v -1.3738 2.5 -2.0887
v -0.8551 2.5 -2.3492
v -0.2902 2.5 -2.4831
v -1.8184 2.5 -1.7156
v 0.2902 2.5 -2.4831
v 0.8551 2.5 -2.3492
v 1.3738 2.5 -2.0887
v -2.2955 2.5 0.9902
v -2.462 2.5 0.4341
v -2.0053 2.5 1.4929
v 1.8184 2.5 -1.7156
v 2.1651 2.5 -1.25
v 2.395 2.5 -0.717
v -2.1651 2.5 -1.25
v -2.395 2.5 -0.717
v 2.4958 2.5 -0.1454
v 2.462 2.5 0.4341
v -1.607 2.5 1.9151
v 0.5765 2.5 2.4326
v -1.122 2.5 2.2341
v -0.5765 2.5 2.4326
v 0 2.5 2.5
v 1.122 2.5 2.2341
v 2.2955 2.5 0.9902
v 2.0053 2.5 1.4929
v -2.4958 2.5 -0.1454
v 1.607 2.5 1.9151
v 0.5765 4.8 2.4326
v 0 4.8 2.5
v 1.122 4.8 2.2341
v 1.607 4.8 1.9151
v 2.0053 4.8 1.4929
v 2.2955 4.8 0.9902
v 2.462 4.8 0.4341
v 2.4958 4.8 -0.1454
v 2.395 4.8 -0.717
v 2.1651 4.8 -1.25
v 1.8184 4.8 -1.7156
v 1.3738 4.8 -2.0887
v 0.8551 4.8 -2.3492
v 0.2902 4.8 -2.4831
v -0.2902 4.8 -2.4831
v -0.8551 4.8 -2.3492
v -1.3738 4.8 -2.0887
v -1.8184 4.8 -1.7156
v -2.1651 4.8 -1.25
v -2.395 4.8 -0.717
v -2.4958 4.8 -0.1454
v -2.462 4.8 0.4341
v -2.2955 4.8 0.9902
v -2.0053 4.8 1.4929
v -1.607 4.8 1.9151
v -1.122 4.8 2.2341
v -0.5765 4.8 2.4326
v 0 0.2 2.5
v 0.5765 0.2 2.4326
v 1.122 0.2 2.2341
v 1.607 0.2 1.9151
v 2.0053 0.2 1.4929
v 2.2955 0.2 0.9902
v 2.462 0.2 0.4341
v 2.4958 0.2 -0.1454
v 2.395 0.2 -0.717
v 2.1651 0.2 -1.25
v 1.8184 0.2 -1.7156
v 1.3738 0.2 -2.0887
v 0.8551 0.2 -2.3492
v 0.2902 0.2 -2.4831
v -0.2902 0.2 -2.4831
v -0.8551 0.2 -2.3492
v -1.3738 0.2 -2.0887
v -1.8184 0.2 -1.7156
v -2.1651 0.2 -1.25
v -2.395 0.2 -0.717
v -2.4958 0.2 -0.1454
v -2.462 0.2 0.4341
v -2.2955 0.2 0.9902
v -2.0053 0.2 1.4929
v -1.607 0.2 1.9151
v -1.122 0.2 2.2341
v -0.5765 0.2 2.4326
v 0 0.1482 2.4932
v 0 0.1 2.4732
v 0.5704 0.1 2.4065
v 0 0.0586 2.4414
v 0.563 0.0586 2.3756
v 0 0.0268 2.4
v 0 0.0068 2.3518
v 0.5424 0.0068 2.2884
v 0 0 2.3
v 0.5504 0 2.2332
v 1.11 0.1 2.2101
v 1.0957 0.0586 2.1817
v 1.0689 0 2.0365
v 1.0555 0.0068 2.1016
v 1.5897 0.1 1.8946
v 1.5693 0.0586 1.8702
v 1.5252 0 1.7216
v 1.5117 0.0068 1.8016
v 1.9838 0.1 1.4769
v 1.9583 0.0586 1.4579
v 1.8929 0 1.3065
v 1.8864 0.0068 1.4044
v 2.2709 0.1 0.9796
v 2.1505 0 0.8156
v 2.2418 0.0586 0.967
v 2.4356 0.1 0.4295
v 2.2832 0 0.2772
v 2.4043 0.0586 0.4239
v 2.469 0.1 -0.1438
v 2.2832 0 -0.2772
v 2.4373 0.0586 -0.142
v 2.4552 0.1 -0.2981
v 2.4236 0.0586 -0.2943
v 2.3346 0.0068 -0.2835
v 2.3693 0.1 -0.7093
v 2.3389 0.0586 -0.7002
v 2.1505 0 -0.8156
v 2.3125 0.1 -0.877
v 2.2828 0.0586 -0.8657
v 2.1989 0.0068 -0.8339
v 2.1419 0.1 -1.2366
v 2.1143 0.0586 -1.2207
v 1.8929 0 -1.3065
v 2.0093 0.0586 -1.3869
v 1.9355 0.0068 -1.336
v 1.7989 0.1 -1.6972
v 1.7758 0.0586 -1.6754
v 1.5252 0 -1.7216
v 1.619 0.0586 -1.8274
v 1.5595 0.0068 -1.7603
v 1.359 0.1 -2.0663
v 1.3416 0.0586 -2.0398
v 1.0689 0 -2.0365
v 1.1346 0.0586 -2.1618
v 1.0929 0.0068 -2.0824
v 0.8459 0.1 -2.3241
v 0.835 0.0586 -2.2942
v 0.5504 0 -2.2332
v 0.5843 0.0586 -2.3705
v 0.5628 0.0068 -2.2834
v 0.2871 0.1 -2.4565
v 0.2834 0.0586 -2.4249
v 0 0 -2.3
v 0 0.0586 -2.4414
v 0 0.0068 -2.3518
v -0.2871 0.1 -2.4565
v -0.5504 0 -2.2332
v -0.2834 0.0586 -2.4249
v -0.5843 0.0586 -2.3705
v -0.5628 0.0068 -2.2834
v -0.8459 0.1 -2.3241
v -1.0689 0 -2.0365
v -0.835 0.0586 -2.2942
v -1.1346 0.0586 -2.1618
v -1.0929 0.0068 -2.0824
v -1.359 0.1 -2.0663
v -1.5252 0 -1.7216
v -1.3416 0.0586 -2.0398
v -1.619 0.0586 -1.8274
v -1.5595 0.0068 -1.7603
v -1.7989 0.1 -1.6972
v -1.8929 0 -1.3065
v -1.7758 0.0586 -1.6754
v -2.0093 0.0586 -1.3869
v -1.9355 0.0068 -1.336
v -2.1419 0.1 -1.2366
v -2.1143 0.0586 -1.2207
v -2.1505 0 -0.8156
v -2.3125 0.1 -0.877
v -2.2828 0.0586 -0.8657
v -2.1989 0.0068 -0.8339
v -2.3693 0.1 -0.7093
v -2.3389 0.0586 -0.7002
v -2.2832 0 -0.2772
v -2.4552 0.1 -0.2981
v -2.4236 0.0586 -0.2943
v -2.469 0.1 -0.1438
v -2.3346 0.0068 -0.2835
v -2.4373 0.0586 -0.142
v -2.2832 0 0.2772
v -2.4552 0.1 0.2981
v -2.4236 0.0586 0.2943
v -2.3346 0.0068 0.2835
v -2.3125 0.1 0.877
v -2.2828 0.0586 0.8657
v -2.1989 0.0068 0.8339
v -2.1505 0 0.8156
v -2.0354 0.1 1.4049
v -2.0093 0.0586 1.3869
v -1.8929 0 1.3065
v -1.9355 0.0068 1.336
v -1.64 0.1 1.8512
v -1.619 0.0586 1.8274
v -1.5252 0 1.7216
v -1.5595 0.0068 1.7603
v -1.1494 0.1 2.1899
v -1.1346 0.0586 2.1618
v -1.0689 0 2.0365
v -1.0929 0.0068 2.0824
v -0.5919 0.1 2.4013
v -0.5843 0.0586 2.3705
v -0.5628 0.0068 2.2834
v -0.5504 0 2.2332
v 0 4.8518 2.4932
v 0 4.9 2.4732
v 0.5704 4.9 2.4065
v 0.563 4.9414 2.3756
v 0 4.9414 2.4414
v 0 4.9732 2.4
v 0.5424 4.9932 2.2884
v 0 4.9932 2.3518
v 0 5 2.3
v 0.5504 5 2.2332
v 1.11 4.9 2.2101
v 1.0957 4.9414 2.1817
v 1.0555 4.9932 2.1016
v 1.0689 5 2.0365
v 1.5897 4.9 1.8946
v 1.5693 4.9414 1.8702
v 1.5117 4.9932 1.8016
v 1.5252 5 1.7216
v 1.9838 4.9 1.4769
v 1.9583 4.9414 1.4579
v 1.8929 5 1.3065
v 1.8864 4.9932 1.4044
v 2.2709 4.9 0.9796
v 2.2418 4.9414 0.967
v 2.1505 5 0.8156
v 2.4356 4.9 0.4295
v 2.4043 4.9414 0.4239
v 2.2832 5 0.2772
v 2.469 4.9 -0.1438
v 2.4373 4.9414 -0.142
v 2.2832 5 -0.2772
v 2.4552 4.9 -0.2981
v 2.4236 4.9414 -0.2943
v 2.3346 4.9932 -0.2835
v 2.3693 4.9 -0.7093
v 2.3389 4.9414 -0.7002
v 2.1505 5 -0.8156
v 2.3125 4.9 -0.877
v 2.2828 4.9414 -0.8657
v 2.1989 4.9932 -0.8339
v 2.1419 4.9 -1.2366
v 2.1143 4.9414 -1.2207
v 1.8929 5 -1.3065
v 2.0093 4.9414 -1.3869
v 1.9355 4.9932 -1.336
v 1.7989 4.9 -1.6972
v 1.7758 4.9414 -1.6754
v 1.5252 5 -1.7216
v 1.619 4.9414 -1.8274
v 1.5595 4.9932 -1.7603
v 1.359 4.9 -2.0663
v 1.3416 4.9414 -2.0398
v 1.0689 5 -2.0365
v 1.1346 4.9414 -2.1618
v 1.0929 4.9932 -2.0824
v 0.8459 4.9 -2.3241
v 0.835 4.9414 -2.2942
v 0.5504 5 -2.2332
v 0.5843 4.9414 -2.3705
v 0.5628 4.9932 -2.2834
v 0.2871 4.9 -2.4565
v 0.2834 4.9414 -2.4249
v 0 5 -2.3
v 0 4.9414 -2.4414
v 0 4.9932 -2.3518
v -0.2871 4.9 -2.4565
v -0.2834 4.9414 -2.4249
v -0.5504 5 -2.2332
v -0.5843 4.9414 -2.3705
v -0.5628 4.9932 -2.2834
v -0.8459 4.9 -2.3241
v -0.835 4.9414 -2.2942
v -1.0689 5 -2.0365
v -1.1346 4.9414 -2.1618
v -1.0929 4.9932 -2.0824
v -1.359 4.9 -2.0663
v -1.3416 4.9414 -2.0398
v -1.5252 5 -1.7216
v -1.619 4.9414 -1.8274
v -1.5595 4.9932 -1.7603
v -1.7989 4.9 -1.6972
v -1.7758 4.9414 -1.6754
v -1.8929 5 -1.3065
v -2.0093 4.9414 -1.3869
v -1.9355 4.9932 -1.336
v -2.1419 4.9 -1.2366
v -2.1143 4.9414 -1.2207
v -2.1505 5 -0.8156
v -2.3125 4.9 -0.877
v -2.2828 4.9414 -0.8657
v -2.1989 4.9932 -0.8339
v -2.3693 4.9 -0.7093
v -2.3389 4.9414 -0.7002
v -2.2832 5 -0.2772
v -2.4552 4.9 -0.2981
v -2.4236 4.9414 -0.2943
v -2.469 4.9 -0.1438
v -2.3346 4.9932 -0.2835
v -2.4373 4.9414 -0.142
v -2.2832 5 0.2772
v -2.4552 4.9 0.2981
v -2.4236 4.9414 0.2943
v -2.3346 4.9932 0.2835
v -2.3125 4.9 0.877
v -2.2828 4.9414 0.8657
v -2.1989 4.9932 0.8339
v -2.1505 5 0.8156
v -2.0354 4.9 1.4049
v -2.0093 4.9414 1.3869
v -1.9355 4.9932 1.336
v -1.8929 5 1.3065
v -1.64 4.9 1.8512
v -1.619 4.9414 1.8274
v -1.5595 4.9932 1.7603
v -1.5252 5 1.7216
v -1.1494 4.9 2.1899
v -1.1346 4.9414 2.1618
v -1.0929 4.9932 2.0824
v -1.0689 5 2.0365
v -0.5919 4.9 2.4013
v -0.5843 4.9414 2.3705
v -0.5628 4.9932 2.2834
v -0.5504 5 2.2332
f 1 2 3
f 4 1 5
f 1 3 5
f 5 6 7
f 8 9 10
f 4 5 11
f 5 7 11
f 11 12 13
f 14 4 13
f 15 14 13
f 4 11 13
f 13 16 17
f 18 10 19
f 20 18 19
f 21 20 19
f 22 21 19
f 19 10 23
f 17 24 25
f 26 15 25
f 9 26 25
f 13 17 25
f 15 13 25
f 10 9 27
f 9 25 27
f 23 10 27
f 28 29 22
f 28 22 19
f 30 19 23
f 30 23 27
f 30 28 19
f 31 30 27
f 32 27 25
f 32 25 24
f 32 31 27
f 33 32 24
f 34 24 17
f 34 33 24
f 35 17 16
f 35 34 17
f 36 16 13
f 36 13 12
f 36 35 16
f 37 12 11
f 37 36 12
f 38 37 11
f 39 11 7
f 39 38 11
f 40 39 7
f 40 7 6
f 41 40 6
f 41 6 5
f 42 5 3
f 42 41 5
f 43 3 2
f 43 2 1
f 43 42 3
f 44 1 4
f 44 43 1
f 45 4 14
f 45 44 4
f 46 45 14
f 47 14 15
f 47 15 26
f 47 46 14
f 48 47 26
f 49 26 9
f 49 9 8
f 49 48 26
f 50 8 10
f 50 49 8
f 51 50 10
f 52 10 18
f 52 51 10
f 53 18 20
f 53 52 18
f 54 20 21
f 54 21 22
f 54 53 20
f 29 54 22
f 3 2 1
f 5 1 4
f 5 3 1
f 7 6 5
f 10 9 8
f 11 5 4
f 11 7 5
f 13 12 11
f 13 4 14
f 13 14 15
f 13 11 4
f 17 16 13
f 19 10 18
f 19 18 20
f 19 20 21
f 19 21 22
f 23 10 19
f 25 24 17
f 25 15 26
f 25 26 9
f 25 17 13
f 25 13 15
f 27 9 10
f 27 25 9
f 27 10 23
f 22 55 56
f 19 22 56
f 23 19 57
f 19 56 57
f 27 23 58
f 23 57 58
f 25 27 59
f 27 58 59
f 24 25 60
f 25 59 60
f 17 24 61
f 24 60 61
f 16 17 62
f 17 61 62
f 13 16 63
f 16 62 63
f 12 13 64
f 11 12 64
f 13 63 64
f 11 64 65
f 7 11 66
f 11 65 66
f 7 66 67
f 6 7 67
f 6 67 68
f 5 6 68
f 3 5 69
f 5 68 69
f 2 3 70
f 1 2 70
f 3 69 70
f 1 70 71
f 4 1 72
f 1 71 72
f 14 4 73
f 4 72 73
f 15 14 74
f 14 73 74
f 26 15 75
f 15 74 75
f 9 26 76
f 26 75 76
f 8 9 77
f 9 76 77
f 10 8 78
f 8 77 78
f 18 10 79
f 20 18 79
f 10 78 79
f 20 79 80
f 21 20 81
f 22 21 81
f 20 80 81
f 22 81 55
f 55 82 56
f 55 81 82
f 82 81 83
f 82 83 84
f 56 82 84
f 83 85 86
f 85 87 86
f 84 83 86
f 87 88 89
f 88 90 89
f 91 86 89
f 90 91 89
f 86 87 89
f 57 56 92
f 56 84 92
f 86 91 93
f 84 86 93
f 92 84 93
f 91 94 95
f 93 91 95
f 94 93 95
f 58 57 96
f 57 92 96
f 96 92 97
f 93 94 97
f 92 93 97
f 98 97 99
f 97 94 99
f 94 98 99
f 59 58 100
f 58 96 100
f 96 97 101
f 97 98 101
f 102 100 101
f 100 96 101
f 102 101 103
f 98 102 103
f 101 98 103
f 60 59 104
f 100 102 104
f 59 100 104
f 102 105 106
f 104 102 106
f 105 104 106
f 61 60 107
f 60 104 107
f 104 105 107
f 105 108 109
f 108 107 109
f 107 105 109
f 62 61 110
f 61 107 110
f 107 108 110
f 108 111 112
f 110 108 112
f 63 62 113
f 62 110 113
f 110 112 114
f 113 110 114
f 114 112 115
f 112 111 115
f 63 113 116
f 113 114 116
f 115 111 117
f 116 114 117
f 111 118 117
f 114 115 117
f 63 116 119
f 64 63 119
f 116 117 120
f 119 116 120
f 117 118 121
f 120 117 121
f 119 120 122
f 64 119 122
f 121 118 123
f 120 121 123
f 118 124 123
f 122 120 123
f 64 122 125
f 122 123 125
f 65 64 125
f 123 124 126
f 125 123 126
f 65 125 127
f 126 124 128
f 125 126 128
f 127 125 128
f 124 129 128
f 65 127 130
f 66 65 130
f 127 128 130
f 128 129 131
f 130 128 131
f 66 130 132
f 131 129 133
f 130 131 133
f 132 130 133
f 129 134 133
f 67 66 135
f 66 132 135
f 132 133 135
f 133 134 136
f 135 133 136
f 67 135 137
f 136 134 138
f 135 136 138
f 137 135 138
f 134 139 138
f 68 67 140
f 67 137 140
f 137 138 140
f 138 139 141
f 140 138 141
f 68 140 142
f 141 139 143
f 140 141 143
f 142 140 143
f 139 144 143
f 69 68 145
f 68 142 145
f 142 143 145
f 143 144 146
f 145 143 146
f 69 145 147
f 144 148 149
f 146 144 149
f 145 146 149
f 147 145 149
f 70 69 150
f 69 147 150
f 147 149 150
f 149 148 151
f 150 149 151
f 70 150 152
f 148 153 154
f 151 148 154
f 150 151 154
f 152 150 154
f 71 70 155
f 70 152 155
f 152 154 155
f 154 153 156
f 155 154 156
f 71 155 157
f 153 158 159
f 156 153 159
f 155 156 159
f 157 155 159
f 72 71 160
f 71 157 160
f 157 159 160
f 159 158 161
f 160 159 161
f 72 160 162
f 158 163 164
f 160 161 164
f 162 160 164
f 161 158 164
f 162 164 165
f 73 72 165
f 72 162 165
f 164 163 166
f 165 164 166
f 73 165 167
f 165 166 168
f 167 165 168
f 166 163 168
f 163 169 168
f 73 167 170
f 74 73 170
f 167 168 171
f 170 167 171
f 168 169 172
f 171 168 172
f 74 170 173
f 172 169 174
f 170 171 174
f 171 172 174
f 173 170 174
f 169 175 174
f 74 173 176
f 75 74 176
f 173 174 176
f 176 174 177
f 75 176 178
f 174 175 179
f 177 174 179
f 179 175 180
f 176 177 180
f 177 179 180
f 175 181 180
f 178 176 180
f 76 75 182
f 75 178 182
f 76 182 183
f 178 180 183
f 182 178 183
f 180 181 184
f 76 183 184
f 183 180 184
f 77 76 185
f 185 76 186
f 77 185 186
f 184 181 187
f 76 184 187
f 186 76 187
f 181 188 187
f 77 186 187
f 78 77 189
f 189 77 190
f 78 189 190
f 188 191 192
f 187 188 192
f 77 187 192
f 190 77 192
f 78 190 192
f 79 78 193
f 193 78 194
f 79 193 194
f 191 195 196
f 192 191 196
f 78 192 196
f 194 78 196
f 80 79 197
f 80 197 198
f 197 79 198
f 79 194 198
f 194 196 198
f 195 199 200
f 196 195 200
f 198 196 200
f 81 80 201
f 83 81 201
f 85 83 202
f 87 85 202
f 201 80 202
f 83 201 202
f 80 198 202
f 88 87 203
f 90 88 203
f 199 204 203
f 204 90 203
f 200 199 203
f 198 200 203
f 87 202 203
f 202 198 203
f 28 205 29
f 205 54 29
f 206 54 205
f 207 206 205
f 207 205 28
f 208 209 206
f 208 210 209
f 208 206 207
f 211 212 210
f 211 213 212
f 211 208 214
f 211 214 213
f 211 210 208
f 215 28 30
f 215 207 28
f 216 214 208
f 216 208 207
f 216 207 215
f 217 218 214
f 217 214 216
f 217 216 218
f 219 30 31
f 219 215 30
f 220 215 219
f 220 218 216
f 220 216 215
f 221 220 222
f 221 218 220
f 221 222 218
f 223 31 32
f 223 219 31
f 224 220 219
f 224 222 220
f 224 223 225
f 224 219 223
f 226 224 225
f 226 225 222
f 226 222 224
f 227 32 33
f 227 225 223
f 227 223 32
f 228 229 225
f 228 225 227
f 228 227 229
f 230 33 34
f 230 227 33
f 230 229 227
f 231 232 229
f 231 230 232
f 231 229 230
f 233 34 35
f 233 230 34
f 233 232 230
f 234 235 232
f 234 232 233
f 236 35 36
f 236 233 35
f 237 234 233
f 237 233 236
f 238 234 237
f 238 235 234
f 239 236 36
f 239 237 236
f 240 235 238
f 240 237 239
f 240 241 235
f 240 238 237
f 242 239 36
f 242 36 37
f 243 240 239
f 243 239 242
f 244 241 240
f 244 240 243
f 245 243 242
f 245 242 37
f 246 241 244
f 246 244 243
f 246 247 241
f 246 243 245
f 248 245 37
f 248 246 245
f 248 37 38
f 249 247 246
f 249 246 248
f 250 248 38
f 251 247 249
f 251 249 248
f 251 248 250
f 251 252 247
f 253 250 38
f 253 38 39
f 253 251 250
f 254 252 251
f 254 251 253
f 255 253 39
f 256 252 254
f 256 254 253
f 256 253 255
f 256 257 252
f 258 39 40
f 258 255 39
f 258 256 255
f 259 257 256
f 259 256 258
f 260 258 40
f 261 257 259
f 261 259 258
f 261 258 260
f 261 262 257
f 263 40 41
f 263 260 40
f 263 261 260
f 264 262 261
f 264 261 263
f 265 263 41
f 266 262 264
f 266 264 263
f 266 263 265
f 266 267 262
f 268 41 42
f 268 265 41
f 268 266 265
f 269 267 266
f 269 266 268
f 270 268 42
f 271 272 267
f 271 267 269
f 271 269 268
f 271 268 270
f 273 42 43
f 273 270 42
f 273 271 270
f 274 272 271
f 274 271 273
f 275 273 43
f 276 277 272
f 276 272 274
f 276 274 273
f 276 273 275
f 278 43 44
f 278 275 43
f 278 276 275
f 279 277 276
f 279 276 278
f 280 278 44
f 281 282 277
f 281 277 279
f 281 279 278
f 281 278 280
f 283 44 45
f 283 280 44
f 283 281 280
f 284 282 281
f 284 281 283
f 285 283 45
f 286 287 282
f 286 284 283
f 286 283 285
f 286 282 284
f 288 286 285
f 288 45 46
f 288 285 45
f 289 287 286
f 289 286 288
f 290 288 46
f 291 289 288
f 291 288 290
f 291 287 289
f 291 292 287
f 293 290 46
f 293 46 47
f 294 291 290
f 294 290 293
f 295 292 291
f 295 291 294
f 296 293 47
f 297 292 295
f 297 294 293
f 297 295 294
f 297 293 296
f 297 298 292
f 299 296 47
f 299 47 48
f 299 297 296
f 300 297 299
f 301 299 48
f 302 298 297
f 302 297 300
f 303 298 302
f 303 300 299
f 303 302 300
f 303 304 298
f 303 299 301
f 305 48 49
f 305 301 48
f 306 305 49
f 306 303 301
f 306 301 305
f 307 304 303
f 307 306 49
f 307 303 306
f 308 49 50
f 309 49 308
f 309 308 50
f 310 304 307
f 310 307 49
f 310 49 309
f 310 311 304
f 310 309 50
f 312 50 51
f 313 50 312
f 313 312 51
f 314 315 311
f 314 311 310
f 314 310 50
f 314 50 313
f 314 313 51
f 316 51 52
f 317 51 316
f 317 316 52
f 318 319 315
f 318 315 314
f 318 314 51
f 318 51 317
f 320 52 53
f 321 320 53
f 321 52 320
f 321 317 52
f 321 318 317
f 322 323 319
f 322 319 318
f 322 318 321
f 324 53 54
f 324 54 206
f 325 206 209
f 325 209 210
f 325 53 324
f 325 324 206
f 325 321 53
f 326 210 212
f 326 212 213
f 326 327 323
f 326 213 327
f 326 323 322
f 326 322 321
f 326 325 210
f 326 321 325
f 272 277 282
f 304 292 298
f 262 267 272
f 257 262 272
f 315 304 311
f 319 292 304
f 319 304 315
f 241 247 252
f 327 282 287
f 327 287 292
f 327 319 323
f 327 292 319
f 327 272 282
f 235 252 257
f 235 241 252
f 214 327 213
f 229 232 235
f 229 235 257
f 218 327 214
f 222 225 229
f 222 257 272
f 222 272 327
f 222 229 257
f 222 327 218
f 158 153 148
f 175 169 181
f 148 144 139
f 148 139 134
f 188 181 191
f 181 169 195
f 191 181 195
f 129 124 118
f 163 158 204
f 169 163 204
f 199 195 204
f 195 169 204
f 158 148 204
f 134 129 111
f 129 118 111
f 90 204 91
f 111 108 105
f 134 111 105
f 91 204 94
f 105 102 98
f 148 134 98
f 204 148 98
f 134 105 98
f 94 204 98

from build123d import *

# Parameters (mm, degrees)
SKETCH1_R           = 2.5
BOSS_EXTRUDE1_DEPTH = 2.5
FILLET1_R           = 0.2


with BuildPart() as part:
    # Sketch1 → Boss-Extrude1 (new body)
    with BuildSketch(Plane(origin=(0, 0, 0), x_dir=(1, 0, 0), z_dir=(0, 1, 0))):
        with Locations(Location((0, 0, 0), (0, 0, 270))):
            Circle(SKETCH1_R)
    extrude(amount=BOSS_EXTRUDE1_DEPTH)

    # Fillet1
    fillet1_edges = [part.edges().sort_by_distance(p)[0] for p in [
        (0, 0, -2.5),
    ]]
    fillet(fillet1_edges, radius=FILLET1_R)


with BuildPart() as body_2:
    # Mirror1: mirrored copy
    add(part.part.mirror(Plane.ZX.offset(2.5)))


solid = Compound([part.part, body_2.part])
